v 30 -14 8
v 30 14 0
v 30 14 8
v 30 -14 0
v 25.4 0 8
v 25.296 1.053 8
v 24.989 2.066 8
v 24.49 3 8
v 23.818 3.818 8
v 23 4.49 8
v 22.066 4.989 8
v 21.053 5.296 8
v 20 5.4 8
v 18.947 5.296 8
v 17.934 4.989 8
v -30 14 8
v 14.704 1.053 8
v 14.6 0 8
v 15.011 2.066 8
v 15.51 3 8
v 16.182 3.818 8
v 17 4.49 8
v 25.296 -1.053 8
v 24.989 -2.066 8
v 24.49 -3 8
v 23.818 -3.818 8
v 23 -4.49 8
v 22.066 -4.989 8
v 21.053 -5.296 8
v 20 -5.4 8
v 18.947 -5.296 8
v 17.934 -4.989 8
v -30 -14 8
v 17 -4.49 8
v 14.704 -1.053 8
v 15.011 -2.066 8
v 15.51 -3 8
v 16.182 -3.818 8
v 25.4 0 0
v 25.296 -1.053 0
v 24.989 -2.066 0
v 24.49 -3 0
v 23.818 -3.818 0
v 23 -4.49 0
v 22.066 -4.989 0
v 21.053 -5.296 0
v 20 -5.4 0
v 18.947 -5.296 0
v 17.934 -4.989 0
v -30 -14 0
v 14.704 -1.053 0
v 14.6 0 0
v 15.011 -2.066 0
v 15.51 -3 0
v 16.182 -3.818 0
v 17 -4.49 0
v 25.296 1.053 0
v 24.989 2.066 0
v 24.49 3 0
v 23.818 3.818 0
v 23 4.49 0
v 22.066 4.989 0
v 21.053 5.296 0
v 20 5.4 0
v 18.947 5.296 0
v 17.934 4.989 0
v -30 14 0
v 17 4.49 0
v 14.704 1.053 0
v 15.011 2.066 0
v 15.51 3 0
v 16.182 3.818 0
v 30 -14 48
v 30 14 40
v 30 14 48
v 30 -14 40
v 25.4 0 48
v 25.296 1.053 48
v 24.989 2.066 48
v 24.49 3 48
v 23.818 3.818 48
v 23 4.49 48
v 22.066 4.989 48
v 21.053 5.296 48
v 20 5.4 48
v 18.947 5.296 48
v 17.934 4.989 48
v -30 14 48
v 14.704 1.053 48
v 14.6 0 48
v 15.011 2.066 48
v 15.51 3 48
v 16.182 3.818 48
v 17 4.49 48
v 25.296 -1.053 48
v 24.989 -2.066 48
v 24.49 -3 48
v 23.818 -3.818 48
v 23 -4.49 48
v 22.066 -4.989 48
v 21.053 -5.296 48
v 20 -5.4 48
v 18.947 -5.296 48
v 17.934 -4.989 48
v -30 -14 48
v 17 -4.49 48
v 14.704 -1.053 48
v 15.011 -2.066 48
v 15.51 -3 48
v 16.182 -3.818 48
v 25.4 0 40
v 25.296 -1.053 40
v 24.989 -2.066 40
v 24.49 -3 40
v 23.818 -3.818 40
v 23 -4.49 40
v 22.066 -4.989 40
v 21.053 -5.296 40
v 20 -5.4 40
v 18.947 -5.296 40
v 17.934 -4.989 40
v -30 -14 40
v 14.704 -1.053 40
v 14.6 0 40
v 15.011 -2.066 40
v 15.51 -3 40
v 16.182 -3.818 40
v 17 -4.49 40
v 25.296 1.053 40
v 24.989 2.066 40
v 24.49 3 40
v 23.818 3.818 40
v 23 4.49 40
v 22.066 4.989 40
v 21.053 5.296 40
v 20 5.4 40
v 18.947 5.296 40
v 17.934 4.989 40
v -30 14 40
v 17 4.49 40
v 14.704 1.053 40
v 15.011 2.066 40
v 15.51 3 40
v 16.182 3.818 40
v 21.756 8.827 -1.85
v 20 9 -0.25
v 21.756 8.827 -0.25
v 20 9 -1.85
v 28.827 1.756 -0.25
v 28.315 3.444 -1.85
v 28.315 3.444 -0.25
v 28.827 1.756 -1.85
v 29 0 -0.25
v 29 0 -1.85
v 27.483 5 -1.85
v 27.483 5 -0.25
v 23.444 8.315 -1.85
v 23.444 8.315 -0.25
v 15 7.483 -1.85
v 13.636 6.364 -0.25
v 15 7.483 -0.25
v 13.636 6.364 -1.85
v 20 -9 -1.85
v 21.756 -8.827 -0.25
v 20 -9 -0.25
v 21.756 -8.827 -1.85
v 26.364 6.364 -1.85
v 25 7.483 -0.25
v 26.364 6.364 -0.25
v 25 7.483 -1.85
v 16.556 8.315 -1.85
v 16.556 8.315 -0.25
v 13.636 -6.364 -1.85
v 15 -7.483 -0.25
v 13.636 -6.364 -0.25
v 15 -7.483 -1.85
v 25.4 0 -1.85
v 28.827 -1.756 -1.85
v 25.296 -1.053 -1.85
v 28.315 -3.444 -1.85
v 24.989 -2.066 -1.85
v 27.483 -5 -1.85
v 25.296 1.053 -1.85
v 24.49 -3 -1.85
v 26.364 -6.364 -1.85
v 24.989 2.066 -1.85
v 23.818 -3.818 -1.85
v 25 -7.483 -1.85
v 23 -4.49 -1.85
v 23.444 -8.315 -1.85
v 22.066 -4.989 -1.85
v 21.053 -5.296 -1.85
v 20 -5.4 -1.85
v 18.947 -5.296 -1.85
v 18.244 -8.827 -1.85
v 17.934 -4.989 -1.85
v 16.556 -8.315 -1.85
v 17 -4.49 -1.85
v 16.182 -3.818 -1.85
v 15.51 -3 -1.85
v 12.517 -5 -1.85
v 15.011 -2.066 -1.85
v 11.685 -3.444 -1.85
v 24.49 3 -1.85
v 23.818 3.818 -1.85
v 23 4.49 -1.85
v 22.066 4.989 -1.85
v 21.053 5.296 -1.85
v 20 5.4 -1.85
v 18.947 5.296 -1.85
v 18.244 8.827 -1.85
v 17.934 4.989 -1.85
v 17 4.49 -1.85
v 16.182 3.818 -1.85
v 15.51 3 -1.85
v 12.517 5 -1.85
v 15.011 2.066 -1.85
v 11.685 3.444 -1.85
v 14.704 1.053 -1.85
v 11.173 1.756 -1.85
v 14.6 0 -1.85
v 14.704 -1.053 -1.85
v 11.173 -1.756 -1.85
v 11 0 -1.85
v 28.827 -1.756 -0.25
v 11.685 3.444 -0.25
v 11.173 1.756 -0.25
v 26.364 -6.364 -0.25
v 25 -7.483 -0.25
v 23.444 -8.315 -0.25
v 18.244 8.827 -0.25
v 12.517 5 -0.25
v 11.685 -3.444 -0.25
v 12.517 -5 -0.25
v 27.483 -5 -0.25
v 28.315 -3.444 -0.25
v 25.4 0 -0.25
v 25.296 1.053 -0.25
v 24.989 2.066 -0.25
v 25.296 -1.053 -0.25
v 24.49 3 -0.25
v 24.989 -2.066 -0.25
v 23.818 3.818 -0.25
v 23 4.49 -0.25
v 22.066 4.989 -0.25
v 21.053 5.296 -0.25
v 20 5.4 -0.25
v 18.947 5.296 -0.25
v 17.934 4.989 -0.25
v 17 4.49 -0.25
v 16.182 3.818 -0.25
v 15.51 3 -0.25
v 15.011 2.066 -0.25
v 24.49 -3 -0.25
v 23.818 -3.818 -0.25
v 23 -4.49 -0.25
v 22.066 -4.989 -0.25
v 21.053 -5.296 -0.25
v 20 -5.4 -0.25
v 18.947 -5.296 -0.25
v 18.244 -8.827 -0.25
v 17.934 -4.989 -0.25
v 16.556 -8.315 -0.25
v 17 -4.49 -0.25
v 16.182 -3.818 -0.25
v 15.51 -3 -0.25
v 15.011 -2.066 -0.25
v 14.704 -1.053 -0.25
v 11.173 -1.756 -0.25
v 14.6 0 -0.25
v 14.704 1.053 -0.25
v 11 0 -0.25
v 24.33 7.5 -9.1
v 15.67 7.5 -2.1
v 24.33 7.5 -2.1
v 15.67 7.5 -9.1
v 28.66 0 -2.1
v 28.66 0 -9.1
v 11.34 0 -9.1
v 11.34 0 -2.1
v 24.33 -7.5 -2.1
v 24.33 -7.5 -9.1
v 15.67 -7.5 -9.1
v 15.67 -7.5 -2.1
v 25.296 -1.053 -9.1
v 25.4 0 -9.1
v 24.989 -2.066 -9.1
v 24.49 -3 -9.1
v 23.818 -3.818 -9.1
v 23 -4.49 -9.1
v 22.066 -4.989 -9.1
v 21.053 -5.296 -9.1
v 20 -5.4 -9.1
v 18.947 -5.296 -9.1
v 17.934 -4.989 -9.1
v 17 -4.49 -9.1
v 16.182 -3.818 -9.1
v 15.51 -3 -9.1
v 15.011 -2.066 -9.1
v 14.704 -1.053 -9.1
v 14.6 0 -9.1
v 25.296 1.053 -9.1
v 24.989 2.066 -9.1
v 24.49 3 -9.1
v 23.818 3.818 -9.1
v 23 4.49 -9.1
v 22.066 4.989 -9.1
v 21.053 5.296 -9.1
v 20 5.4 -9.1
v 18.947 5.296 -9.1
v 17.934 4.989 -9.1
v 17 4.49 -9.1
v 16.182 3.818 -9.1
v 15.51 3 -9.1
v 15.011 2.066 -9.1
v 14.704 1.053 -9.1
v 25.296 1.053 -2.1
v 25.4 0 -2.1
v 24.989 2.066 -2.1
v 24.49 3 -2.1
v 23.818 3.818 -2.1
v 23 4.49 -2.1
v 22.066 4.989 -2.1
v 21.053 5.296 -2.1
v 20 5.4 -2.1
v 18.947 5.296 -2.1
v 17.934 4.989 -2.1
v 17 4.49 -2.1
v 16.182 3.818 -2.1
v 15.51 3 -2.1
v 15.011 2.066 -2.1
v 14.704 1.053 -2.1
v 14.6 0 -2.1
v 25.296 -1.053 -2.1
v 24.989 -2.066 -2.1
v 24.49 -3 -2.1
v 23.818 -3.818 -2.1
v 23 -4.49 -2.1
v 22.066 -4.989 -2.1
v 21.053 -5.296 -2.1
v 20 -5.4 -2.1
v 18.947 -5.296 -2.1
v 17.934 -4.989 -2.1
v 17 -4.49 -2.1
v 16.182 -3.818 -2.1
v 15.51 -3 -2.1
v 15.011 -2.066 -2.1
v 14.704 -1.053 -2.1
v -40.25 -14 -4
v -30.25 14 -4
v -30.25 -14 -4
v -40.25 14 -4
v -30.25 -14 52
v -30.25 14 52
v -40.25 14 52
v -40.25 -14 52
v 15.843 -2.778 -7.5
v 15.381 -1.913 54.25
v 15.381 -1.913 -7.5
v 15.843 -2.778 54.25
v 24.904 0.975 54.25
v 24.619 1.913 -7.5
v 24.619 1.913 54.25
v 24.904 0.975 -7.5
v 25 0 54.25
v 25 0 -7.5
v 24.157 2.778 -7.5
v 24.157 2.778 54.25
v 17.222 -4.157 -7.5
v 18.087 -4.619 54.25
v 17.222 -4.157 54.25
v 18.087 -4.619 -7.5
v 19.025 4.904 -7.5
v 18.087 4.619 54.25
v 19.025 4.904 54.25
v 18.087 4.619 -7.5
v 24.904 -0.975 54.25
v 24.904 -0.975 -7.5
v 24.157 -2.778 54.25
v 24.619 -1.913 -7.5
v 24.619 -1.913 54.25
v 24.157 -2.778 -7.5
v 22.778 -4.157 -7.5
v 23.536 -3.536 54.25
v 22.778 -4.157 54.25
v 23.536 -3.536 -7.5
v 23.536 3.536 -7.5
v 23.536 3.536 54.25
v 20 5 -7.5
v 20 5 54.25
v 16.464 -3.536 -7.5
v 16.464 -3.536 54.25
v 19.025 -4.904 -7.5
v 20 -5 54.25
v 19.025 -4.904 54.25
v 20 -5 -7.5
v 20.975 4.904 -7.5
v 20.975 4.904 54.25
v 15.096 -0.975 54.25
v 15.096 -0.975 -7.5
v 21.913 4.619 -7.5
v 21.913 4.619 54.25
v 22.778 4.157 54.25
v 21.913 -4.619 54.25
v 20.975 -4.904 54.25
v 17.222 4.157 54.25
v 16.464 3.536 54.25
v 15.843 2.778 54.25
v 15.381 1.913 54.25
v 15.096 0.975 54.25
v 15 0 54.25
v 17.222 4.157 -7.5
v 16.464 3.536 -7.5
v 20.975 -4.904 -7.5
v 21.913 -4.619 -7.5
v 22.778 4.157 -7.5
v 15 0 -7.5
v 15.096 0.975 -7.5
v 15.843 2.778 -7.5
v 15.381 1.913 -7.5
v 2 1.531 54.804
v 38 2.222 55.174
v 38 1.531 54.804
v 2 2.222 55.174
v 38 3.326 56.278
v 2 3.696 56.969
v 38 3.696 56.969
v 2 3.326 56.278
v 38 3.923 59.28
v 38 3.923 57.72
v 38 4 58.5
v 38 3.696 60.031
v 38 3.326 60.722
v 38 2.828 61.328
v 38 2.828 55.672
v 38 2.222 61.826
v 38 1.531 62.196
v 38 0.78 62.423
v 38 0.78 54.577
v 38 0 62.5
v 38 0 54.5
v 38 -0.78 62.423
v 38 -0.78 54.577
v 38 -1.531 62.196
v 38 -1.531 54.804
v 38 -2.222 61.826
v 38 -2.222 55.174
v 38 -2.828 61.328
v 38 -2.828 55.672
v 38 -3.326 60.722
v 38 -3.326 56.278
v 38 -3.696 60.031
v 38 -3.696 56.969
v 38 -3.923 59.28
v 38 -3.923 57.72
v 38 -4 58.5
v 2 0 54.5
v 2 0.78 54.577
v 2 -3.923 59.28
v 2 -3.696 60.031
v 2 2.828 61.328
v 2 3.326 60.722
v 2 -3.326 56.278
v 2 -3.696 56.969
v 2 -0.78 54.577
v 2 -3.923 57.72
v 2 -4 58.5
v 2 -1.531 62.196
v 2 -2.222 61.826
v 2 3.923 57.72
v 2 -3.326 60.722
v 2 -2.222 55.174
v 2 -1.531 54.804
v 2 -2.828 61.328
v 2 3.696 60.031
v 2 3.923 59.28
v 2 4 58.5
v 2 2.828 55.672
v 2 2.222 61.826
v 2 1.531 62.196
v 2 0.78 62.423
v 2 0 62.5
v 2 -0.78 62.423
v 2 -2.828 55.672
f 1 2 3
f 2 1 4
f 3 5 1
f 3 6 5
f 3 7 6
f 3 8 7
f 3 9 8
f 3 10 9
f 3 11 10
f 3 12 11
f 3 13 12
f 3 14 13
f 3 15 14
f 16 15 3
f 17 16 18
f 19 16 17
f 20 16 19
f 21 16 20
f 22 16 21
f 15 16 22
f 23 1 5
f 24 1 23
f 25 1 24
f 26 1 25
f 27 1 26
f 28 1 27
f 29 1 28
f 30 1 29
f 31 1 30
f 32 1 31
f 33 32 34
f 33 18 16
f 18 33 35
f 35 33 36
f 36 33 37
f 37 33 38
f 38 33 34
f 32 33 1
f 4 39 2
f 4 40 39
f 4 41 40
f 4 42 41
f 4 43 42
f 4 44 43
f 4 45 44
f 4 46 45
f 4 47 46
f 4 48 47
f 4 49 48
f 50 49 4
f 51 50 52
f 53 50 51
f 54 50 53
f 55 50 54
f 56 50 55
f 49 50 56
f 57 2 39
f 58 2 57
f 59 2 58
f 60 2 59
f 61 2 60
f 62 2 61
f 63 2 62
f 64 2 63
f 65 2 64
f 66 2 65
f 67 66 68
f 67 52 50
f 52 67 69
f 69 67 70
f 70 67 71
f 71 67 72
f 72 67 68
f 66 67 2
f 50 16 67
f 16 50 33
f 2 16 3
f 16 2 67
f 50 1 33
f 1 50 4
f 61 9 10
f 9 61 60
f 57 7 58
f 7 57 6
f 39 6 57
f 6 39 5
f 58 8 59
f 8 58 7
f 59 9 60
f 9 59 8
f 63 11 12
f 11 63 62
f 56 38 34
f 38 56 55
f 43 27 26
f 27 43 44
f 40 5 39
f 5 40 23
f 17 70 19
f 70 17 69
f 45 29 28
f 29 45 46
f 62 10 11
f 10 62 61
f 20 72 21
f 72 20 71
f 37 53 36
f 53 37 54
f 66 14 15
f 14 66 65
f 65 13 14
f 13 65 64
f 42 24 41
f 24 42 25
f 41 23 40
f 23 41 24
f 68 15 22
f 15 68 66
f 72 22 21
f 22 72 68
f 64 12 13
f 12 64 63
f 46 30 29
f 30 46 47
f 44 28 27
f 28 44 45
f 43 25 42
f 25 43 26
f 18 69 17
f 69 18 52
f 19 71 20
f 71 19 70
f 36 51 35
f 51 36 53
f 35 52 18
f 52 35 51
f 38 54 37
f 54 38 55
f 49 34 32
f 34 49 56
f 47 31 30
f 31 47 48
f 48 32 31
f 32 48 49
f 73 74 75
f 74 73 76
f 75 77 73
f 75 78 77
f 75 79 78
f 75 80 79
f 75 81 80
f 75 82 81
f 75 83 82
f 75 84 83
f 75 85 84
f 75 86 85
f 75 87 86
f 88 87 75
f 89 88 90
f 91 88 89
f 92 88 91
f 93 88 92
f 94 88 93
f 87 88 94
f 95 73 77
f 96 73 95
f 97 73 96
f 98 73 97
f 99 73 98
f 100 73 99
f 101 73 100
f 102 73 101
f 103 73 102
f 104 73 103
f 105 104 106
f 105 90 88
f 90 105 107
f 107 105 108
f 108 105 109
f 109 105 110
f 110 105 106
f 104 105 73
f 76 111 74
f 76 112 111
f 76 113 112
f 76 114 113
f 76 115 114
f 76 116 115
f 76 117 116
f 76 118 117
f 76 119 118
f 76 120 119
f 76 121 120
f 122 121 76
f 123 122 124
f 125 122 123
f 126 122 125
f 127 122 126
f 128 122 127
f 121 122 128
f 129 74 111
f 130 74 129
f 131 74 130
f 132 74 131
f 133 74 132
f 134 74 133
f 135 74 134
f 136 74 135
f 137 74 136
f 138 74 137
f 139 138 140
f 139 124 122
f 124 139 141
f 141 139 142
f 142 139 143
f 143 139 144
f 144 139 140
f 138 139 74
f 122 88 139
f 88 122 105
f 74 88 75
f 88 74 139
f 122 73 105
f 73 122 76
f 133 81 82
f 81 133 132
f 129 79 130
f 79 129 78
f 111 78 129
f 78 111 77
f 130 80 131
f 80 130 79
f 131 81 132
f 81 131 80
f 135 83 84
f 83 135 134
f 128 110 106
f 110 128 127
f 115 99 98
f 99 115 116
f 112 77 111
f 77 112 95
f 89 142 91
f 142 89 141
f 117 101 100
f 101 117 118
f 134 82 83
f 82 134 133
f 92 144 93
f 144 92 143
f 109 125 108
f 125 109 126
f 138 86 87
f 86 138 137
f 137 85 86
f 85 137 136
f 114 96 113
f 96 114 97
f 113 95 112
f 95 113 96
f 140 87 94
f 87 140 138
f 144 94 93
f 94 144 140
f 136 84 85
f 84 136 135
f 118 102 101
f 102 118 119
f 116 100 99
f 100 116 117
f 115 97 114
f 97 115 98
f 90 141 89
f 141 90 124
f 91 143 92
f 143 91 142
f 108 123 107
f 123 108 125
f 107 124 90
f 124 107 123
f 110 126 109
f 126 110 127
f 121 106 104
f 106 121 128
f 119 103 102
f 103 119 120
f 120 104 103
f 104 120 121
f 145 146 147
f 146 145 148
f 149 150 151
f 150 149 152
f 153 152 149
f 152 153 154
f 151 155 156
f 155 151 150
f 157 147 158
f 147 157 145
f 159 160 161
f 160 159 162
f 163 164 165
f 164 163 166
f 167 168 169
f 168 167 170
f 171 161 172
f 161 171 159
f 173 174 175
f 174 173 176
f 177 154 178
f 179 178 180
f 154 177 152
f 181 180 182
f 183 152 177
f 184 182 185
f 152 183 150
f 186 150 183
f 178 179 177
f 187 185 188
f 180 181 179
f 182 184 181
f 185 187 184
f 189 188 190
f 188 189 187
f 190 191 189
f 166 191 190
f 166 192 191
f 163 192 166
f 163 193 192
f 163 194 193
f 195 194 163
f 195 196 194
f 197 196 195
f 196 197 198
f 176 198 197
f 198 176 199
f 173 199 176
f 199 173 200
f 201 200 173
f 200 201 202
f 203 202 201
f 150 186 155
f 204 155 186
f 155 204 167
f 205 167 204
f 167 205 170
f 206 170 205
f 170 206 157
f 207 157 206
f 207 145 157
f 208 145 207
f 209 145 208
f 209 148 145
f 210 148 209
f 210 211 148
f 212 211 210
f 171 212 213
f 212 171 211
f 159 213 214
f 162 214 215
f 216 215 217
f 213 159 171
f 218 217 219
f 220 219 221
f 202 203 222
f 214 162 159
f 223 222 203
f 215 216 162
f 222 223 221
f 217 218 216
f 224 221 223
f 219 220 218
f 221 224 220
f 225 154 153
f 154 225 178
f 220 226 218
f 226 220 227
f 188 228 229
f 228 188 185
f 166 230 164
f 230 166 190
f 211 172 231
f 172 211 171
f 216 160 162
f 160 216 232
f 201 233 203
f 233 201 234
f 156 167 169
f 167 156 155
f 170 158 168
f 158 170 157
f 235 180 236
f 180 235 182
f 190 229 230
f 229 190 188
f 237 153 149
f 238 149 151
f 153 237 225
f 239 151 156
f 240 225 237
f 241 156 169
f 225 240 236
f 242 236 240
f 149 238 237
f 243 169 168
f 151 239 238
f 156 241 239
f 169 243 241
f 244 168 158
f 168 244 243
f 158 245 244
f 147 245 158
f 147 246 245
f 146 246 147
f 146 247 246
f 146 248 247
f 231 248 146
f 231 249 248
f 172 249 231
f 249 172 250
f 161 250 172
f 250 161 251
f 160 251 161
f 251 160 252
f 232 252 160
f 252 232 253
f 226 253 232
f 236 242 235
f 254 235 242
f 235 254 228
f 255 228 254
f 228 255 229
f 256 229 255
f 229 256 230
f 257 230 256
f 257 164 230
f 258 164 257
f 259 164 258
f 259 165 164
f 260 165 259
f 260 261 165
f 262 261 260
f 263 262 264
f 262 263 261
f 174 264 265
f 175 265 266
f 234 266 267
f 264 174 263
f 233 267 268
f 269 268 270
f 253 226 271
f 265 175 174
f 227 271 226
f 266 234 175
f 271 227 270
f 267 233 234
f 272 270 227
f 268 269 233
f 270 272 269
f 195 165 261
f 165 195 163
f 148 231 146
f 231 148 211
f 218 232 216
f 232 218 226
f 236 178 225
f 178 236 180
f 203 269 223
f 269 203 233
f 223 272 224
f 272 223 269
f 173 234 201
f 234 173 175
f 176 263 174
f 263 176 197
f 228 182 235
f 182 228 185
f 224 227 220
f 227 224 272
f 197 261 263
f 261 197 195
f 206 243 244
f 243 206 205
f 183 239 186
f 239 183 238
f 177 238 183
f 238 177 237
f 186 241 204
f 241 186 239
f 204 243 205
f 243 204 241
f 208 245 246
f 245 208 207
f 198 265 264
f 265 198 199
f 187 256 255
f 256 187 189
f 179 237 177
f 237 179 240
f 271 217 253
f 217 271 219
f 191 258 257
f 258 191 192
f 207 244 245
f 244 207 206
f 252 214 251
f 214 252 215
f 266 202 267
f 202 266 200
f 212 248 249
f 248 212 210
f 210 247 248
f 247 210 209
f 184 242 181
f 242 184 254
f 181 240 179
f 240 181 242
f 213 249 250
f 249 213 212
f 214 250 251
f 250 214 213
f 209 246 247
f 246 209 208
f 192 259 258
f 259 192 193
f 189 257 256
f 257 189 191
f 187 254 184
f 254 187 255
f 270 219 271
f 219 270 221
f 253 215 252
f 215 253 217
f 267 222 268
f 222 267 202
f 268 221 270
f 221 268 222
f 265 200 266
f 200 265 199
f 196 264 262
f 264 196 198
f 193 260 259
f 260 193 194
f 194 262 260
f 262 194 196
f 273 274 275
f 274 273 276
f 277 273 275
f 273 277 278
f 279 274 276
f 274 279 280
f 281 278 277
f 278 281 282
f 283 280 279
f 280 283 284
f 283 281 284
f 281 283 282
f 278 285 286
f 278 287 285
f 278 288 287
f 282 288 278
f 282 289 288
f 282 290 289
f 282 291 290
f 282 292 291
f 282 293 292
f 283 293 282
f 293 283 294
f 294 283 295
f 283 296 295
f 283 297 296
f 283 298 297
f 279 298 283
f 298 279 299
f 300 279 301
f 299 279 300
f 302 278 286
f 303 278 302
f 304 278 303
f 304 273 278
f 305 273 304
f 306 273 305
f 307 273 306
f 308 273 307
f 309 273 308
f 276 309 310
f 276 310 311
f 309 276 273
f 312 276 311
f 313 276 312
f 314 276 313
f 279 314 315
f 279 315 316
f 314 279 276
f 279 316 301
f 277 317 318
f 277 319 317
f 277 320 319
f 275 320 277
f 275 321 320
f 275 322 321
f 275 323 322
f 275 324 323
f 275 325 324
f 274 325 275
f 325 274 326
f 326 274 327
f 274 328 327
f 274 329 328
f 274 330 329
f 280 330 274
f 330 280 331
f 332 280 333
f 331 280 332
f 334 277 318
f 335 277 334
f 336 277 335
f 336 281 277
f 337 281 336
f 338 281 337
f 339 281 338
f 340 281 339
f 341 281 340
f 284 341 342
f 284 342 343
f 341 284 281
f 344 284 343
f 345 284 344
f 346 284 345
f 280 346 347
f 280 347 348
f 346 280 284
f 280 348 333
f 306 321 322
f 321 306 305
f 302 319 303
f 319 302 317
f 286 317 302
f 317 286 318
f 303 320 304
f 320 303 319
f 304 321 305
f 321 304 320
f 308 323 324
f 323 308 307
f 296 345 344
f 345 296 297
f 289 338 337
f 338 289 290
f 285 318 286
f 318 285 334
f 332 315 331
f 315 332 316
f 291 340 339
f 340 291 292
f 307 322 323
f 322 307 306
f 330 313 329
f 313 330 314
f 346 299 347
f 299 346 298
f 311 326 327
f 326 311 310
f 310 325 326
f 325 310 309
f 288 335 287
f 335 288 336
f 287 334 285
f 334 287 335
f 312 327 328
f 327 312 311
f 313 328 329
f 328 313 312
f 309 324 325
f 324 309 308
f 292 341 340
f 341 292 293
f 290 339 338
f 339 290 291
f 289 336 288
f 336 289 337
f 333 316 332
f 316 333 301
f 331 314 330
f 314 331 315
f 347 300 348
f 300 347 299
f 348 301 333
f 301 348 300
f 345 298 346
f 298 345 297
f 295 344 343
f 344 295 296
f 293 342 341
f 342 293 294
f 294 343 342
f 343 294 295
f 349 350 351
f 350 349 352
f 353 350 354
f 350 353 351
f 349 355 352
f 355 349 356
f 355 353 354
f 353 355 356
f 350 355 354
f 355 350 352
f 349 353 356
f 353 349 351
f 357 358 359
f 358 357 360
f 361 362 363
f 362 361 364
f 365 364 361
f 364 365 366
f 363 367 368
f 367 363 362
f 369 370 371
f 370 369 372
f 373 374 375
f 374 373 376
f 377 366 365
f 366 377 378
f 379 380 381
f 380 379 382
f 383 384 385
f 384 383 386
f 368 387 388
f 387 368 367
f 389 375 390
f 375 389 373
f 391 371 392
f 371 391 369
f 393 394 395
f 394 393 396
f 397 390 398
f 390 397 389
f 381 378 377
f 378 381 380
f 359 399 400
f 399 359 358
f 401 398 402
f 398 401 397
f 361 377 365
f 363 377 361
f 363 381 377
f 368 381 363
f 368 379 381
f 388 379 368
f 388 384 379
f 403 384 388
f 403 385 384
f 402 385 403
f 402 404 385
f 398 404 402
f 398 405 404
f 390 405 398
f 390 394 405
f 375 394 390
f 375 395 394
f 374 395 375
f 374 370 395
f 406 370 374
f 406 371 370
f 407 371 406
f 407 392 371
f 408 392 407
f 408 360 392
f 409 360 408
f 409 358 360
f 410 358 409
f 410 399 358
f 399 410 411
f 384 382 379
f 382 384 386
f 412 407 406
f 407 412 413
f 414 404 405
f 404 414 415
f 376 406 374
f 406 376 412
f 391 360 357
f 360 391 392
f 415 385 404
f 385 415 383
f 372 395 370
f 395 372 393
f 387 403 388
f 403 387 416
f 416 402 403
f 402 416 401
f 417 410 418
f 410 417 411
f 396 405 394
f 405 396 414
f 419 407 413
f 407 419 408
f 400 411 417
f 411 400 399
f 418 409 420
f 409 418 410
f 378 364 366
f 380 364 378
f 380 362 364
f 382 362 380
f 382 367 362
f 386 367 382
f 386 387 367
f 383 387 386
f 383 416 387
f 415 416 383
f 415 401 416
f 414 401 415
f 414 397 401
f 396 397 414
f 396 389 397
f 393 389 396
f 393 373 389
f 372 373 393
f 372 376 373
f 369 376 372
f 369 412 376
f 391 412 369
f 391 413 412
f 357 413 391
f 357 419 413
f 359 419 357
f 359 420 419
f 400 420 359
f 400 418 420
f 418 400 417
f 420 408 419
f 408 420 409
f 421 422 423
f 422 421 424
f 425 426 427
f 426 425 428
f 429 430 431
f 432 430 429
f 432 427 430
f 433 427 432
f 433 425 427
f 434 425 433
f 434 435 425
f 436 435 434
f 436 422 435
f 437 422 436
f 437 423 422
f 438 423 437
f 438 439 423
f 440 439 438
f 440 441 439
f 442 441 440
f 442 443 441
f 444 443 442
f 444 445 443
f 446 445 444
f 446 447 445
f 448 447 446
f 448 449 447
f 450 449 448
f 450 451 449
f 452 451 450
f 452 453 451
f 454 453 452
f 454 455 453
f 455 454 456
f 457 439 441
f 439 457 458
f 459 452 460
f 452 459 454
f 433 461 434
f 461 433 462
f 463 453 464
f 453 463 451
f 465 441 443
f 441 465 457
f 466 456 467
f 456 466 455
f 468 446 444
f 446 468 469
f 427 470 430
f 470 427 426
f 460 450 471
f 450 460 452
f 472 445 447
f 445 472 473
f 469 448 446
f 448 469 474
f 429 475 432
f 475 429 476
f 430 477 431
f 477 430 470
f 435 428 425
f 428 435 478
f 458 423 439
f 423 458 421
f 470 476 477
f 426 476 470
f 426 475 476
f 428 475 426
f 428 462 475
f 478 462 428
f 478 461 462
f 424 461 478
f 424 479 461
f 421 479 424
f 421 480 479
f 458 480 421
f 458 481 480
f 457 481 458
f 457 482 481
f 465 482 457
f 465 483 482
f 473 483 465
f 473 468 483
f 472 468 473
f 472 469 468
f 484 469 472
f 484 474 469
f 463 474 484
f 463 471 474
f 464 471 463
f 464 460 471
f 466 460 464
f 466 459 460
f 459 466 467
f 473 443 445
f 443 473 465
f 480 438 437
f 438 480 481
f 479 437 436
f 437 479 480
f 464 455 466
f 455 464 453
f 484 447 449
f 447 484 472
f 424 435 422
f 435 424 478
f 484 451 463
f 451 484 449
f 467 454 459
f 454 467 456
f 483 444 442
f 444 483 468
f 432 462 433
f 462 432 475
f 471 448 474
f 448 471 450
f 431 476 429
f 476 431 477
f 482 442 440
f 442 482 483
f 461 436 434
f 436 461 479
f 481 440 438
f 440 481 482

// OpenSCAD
$fn = 32;

// ------------------------------------------------------------------------
// C clamp: throat 40 mm, screw d10
// Every part is its own module, assembly() places every instance.
// ------------------------------------------------------------------------

// --- part 1 ---
module clamp_arm() {
  difference() {
    translate([-30, -14, 0]) cube([60, 28, 8]);
    translate([20, 0, -1]) cylinder(h = 10, d = 10.8);
  }
}

// --- part 2 ---
module clamp_spine() {
  difference() {
    translate([-28, -14, 0]) cube([56, 28, 10]);
  }
}

// --- part 3 ---
module clamp_screw() {
  translate([0, 0, -30.875]) cylinder(h = 61.75, d = 10);
}

// --- part 4 ---
module clamp_washer() {
  difference() {
      translate([0, 0, 0]) cylinder(h = 1.6, d = 18);
      translate([0, 0, -1]) cylinder(h = 3.6, d = 10.8);
    }
}

// --- part 5 ---
module clamp_nut() {
  difference() {
    linear_extrude(height = 7) polygon(points = [[8.66, 0], [4.33, 7.5], [-4.33, 7.5], [-8.66, 0], [-4.33, -7.5], [4.33, -7.5]]);
    translate([0, 0, -1]) cylinder(h = 9, d = 10.8);
  }
}

// --- part 6 ---
module tommy_bar() {
  translate([0, 0, -18]) cylinder(h = 36, d = 8);
}

// --- assembly ---
module assembly() {
  color([0.80, 0.24, 0.20]) translate([0, 0, 0]) rotate([0, 0, 0]) clamp_arm();
  color([0.20, 0.45, 0.75]) translate([0, 0, 40]) rotate([0, 0, 0]) clamp_arm();
  color([0.25, 0.62, 0.32]) translate([-40.25, 0, 24]) rotate([0, 90, 0]) clamp_spine();
  color([0.92, 0.70, 0.18]) translate([20, 0, 23.375]) rotate([0, 0, 0]) clamp_screw();
  color([0.58, 0.35, 0.70]) translate([20, 0, -1.85]) rotate([0, 0, 0]) clamp_washer();
  color([0.16, 0.66, 0.66]) translate([20, 0, -9.1]) rotate([0, 0, 0]) clamp_nut();
  color([0.85, 0.48, 0.18]) translate([20, 0, 58.5]) rotate([0, 90, 0]) tommy_bar();
}

assembly();
